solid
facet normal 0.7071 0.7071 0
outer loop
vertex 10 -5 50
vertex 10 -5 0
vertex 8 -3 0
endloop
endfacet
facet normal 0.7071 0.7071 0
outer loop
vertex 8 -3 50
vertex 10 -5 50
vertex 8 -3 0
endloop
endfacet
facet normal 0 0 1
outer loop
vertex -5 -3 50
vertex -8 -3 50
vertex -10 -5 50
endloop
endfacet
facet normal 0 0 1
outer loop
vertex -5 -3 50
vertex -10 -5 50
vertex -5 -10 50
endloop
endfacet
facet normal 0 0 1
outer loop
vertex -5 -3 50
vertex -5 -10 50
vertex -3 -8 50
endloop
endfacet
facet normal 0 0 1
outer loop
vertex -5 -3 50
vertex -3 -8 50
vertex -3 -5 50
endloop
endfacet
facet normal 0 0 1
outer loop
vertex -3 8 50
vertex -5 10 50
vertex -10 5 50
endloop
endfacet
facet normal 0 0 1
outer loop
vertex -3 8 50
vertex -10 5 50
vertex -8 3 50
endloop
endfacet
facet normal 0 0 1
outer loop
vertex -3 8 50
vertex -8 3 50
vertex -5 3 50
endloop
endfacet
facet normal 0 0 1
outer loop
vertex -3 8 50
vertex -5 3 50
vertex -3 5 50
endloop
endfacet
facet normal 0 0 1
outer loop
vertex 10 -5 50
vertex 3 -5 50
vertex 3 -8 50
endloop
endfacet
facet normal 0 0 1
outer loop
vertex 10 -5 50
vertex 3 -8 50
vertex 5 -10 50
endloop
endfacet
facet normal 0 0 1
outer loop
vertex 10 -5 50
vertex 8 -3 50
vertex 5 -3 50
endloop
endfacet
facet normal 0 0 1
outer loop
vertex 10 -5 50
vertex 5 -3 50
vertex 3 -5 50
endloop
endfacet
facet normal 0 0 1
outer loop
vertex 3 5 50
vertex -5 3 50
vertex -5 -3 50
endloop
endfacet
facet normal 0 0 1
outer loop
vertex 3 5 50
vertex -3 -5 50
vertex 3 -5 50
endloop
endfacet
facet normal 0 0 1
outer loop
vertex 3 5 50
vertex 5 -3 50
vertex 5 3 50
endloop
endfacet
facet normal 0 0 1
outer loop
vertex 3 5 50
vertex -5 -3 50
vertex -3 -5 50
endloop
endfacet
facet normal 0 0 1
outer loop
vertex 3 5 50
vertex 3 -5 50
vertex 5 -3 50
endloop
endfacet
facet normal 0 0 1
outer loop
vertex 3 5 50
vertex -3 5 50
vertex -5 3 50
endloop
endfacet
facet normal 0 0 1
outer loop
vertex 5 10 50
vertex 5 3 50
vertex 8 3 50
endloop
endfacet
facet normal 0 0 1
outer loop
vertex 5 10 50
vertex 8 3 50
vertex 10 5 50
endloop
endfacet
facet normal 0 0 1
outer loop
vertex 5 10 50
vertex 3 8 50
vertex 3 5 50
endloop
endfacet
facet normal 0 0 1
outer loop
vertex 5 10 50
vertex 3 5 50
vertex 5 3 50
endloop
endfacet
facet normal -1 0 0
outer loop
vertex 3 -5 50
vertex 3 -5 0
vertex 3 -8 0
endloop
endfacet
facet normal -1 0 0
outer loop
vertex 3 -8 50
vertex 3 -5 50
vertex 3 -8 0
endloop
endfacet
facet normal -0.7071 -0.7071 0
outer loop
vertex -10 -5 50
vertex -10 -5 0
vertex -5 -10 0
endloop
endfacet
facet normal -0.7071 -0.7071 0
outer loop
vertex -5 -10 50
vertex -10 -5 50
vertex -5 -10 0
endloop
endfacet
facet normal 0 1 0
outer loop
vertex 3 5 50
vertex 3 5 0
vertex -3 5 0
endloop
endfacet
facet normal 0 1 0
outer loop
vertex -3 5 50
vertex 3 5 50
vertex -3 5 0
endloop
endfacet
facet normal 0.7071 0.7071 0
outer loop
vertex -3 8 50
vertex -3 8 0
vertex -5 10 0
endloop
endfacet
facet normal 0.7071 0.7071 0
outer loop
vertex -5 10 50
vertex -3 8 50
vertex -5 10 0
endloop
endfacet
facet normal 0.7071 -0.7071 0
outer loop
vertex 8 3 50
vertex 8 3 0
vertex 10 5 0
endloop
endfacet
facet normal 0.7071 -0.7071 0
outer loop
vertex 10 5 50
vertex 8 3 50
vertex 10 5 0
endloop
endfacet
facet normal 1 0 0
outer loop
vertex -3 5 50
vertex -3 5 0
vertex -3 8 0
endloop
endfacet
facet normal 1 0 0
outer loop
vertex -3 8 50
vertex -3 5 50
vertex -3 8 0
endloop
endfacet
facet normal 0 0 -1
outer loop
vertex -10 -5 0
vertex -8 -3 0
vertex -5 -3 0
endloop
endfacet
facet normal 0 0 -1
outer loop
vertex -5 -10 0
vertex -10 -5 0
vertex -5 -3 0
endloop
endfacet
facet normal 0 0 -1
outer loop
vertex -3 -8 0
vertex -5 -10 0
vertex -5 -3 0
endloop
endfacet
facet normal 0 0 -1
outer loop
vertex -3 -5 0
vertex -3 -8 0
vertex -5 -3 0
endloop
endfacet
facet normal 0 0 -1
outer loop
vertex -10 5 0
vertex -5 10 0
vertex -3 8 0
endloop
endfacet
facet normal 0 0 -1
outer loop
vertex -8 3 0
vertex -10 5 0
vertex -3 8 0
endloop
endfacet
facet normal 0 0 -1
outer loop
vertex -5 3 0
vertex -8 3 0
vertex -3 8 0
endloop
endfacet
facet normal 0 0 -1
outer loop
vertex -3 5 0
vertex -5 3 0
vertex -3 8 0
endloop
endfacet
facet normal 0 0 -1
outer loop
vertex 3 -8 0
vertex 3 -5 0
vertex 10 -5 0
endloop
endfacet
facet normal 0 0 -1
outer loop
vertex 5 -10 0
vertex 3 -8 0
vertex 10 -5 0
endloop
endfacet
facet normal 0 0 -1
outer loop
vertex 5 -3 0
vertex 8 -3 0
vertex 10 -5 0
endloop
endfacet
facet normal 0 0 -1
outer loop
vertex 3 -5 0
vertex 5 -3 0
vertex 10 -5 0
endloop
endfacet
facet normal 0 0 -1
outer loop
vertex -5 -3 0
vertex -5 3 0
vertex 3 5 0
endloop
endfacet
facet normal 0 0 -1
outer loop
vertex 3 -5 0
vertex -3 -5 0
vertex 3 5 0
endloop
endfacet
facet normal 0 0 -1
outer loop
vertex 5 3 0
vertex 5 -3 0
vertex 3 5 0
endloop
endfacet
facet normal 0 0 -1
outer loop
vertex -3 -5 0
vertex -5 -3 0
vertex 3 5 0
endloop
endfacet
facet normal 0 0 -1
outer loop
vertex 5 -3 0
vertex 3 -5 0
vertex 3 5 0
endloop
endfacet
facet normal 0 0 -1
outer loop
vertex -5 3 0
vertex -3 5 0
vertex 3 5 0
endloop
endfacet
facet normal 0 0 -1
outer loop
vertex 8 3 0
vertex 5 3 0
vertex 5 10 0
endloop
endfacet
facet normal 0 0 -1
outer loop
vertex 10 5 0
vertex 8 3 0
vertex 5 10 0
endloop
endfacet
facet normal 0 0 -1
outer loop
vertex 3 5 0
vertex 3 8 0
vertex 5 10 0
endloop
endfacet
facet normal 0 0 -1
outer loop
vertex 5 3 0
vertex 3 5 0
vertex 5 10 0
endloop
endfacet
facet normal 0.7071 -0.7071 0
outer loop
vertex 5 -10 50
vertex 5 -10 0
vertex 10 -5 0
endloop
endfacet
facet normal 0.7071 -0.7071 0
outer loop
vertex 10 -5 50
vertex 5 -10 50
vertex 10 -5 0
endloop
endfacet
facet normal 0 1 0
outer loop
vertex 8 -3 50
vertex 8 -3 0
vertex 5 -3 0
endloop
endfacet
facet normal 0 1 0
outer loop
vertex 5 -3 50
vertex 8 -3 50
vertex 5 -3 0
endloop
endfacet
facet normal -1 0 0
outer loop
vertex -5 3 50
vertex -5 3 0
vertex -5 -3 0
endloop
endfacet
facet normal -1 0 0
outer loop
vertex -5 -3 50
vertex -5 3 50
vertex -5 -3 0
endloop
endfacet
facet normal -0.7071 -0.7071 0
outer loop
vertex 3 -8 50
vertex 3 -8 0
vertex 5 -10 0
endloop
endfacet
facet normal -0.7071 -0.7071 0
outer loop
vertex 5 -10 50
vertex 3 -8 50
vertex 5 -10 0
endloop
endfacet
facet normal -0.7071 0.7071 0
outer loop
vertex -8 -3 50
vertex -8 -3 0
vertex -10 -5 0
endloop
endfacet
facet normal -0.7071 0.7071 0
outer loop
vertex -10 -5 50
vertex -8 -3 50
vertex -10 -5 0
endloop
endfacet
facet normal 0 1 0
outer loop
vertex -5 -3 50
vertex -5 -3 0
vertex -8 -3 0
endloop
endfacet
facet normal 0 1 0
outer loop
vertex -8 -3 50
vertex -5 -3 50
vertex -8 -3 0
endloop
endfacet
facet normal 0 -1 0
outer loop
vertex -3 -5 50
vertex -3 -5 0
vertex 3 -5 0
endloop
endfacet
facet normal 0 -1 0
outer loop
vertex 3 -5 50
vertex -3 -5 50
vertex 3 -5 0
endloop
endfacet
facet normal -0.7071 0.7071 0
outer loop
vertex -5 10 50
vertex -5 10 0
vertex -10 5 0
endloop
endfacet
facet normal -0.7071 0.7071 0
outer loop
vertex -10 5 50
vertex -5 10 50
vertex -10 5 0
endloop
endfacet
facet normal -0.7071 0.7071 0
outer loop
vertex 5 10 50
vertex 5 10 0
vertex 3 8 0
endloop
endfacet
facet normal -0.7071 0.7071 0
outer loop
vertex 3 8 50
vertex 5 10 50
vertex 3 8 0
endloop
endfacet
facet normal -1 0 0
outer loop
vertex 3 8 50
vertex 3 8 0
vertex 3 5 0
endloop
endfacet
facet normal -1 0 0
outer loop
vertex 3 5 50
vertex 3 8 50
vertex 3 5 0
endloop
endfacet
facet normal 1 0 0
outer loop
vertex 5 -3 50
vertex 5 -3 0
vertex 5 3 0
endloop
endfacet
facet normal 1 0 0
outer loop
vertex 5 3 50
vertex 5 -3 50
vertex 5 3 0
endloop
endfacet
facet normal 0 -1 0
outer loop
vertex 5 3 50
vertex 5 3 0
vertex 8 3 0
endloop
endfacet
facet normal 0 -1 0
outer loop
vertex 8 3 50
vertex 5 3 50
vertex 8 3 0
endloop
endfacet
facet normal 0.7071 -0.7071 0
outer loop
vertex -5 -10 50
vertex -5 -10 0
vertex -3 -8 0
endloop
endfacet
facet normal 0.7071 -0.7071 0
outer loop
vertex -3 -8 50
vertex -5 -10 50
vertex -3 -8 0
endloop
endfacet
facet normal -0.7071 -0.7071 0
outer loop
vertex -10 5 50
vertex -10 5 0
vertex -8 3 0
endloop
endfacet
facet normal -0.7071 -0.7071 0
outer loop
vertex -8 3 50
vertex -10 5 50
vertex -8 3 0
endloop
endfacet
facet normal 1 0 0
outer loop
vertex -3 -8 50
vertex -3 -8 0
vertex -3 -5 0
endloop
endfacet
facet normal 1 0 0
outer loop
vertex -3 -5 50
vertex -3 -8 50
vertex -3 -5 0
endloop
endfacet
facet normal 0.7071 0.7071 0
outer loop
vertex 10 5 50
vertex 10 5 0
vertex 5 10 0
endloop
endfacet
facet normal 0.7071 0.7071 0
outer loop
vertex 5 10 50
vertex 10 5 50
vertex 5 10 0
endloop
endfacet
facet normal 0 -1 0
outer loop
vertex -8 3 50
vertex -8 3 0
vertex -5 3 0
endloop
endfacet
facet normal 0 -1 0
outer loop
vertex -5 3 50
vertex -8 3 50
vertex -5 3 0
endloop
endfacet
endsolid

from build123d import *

# Parameters (mm, degrees)
F1_DEPTH = 50


with BuildPart() as f1:
    # F0 (on Top) → F1 (new body)
    with BuildSketch(Plane.XY):
        Polygon((-3, 8), (-5, 10), (-10, 5), (-8, 3), (-5, 3), (-5, 5), (-3, 5), align=None)
        Polygon((5, 5), (3, 5), (-3, 5), (-5, 5), (-5, 3), (-5, -3), (-5, -5), (-3, -5), (3, -5), (5, -5), (5, -3), (5, 3), align=None)
        Polygon((10, 5), (5, 10), (3, 8), (3, 5), (5, 5), (5, 3), (8, 3), align=None)
        Polygon((5, -10), (10, -5), (8, -3), (5, -3), (5, -5), (3, -5), (3, -8), align=None)
        Polygon((-8, -3), (-10, -5), (-5, -10), (-3, -8), (-3, -5), (-5, -5), (-5, -3), align=None)
    extrude(amount=F1_DEPTH)


solid = f1.part
